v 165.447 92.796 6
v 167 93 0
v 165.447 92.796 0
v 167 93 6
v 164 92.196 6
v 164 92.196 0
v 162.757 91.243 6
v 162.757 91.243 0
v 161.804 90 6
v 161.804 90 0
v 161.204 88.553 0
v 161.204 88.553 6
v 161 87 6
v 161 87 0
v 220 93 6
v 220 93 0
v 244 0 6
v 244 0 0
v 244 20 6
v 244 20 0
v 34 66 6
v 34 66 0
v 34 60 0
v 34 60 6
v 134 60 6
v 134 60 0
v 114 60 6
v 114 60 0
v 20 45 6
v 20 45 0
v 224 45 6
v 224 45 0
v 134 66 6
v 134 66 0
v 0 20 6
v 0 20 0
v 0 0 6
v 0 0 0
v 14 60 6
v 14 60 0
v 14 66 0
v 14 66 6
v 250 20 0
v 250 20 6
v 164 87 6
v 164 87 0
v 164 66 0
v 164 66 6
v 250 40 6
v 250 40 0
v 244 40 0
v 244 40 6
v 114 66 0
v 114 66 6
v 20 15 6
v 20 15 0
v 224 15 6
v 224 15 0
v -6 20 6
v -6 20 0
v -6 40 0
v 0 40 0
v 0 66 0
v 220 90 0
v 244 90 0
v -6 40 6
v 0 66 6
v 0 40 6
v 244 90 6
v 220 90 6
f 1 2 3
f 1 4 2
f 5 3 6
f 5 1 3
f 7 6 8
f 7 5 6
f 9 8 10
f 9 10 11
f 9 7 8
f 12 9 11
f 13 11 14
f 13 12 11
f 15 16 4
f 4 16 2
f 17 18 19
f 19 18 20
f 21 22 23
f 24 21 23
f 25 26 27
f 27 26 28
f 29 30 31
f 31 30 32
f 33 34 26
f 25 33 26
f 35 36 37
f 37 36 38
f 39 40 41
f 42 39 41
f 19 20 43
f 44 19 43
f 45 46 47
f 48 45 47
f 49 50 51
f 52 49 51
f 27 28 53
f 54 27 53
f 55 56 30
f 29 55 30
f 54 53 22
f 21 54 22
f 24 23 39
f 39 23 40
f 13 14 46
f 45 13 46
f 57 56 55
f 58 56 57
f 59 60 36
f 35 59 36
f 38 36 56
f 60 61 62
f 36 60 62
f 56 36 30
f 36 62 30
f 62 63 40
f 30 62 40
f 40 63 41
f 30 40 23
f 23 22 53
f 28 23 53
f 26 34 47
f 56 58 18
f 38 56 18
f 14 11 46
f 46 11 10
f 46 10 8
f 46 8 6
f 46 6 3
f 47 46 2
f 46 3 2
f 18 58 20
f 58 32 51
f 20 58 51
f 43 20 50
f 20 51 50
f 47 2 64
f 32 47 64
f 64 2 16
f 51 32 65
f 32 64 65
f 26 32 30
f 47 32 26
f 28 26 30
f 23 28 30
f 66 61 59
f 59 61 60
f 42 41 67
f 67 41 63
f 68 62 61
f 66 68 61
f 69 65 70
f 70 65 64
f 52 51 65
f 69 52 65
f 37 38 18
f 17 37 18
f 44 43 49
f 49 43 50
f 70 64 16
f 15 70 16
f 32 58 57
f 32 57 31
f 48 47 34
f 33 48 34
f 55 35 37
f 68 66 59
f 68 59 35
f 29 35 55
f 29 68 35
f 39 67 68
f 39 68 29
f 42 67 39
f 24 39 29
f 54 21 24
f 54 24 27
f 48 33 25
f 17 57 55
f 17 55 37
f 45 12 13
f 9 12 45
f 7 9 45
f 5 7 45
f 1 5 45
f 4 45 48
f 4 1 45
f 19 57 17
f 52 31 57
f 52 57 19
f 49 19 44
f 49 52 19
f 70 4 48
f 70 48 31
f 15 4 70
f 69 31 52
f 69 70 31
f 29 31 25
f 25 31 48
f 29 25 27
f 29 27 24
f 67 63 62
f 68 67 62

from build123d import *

# Parameters (mm, degrees)
SKETCH_1_W      = 204
SKETCH_1_H      = 30
EXTRUDE_1_DEPTH = 6
FILLET_2_R      = 6


with BuildPart() as part:
    # Эскиз1 → Бобышка-Вытянуть1 (new body)
    with BuildSketch(Plane.XY):
        Polygon((0, 20), (0, 0), (244, 0), (244, 20), (250, 20), (250, 40), (244, 40), (244, 90), (220, 90), (220, 93), (161, 93), (161, 87), (164, 87), (164, 66), (134, 66), (134, 60), (114, 60), (114, 66), (34, 66), (34, 60), (14, 60), (14, 66), (0, 66), (0, 40), (-6, 40), (-6, 20), align=None)
        with Locations((122, 30)):
            Rectangle(SKETCH_1_W, SKETCH_1_H, mode=Mode.SUBTRACT)
    extrude(amount=EXTRUDE_1_DEPTH)

    # Скругление2
    fillet_2_edges = [part.edges().sort_by_distance(p)[0] for p in [
        (161, 93, 3),
    ]]
    fillet(fillet_2_edges, radius=FILLET_2_R - 0.0001)  # a hair under: the kernel refuses the full size


solid = part.part
